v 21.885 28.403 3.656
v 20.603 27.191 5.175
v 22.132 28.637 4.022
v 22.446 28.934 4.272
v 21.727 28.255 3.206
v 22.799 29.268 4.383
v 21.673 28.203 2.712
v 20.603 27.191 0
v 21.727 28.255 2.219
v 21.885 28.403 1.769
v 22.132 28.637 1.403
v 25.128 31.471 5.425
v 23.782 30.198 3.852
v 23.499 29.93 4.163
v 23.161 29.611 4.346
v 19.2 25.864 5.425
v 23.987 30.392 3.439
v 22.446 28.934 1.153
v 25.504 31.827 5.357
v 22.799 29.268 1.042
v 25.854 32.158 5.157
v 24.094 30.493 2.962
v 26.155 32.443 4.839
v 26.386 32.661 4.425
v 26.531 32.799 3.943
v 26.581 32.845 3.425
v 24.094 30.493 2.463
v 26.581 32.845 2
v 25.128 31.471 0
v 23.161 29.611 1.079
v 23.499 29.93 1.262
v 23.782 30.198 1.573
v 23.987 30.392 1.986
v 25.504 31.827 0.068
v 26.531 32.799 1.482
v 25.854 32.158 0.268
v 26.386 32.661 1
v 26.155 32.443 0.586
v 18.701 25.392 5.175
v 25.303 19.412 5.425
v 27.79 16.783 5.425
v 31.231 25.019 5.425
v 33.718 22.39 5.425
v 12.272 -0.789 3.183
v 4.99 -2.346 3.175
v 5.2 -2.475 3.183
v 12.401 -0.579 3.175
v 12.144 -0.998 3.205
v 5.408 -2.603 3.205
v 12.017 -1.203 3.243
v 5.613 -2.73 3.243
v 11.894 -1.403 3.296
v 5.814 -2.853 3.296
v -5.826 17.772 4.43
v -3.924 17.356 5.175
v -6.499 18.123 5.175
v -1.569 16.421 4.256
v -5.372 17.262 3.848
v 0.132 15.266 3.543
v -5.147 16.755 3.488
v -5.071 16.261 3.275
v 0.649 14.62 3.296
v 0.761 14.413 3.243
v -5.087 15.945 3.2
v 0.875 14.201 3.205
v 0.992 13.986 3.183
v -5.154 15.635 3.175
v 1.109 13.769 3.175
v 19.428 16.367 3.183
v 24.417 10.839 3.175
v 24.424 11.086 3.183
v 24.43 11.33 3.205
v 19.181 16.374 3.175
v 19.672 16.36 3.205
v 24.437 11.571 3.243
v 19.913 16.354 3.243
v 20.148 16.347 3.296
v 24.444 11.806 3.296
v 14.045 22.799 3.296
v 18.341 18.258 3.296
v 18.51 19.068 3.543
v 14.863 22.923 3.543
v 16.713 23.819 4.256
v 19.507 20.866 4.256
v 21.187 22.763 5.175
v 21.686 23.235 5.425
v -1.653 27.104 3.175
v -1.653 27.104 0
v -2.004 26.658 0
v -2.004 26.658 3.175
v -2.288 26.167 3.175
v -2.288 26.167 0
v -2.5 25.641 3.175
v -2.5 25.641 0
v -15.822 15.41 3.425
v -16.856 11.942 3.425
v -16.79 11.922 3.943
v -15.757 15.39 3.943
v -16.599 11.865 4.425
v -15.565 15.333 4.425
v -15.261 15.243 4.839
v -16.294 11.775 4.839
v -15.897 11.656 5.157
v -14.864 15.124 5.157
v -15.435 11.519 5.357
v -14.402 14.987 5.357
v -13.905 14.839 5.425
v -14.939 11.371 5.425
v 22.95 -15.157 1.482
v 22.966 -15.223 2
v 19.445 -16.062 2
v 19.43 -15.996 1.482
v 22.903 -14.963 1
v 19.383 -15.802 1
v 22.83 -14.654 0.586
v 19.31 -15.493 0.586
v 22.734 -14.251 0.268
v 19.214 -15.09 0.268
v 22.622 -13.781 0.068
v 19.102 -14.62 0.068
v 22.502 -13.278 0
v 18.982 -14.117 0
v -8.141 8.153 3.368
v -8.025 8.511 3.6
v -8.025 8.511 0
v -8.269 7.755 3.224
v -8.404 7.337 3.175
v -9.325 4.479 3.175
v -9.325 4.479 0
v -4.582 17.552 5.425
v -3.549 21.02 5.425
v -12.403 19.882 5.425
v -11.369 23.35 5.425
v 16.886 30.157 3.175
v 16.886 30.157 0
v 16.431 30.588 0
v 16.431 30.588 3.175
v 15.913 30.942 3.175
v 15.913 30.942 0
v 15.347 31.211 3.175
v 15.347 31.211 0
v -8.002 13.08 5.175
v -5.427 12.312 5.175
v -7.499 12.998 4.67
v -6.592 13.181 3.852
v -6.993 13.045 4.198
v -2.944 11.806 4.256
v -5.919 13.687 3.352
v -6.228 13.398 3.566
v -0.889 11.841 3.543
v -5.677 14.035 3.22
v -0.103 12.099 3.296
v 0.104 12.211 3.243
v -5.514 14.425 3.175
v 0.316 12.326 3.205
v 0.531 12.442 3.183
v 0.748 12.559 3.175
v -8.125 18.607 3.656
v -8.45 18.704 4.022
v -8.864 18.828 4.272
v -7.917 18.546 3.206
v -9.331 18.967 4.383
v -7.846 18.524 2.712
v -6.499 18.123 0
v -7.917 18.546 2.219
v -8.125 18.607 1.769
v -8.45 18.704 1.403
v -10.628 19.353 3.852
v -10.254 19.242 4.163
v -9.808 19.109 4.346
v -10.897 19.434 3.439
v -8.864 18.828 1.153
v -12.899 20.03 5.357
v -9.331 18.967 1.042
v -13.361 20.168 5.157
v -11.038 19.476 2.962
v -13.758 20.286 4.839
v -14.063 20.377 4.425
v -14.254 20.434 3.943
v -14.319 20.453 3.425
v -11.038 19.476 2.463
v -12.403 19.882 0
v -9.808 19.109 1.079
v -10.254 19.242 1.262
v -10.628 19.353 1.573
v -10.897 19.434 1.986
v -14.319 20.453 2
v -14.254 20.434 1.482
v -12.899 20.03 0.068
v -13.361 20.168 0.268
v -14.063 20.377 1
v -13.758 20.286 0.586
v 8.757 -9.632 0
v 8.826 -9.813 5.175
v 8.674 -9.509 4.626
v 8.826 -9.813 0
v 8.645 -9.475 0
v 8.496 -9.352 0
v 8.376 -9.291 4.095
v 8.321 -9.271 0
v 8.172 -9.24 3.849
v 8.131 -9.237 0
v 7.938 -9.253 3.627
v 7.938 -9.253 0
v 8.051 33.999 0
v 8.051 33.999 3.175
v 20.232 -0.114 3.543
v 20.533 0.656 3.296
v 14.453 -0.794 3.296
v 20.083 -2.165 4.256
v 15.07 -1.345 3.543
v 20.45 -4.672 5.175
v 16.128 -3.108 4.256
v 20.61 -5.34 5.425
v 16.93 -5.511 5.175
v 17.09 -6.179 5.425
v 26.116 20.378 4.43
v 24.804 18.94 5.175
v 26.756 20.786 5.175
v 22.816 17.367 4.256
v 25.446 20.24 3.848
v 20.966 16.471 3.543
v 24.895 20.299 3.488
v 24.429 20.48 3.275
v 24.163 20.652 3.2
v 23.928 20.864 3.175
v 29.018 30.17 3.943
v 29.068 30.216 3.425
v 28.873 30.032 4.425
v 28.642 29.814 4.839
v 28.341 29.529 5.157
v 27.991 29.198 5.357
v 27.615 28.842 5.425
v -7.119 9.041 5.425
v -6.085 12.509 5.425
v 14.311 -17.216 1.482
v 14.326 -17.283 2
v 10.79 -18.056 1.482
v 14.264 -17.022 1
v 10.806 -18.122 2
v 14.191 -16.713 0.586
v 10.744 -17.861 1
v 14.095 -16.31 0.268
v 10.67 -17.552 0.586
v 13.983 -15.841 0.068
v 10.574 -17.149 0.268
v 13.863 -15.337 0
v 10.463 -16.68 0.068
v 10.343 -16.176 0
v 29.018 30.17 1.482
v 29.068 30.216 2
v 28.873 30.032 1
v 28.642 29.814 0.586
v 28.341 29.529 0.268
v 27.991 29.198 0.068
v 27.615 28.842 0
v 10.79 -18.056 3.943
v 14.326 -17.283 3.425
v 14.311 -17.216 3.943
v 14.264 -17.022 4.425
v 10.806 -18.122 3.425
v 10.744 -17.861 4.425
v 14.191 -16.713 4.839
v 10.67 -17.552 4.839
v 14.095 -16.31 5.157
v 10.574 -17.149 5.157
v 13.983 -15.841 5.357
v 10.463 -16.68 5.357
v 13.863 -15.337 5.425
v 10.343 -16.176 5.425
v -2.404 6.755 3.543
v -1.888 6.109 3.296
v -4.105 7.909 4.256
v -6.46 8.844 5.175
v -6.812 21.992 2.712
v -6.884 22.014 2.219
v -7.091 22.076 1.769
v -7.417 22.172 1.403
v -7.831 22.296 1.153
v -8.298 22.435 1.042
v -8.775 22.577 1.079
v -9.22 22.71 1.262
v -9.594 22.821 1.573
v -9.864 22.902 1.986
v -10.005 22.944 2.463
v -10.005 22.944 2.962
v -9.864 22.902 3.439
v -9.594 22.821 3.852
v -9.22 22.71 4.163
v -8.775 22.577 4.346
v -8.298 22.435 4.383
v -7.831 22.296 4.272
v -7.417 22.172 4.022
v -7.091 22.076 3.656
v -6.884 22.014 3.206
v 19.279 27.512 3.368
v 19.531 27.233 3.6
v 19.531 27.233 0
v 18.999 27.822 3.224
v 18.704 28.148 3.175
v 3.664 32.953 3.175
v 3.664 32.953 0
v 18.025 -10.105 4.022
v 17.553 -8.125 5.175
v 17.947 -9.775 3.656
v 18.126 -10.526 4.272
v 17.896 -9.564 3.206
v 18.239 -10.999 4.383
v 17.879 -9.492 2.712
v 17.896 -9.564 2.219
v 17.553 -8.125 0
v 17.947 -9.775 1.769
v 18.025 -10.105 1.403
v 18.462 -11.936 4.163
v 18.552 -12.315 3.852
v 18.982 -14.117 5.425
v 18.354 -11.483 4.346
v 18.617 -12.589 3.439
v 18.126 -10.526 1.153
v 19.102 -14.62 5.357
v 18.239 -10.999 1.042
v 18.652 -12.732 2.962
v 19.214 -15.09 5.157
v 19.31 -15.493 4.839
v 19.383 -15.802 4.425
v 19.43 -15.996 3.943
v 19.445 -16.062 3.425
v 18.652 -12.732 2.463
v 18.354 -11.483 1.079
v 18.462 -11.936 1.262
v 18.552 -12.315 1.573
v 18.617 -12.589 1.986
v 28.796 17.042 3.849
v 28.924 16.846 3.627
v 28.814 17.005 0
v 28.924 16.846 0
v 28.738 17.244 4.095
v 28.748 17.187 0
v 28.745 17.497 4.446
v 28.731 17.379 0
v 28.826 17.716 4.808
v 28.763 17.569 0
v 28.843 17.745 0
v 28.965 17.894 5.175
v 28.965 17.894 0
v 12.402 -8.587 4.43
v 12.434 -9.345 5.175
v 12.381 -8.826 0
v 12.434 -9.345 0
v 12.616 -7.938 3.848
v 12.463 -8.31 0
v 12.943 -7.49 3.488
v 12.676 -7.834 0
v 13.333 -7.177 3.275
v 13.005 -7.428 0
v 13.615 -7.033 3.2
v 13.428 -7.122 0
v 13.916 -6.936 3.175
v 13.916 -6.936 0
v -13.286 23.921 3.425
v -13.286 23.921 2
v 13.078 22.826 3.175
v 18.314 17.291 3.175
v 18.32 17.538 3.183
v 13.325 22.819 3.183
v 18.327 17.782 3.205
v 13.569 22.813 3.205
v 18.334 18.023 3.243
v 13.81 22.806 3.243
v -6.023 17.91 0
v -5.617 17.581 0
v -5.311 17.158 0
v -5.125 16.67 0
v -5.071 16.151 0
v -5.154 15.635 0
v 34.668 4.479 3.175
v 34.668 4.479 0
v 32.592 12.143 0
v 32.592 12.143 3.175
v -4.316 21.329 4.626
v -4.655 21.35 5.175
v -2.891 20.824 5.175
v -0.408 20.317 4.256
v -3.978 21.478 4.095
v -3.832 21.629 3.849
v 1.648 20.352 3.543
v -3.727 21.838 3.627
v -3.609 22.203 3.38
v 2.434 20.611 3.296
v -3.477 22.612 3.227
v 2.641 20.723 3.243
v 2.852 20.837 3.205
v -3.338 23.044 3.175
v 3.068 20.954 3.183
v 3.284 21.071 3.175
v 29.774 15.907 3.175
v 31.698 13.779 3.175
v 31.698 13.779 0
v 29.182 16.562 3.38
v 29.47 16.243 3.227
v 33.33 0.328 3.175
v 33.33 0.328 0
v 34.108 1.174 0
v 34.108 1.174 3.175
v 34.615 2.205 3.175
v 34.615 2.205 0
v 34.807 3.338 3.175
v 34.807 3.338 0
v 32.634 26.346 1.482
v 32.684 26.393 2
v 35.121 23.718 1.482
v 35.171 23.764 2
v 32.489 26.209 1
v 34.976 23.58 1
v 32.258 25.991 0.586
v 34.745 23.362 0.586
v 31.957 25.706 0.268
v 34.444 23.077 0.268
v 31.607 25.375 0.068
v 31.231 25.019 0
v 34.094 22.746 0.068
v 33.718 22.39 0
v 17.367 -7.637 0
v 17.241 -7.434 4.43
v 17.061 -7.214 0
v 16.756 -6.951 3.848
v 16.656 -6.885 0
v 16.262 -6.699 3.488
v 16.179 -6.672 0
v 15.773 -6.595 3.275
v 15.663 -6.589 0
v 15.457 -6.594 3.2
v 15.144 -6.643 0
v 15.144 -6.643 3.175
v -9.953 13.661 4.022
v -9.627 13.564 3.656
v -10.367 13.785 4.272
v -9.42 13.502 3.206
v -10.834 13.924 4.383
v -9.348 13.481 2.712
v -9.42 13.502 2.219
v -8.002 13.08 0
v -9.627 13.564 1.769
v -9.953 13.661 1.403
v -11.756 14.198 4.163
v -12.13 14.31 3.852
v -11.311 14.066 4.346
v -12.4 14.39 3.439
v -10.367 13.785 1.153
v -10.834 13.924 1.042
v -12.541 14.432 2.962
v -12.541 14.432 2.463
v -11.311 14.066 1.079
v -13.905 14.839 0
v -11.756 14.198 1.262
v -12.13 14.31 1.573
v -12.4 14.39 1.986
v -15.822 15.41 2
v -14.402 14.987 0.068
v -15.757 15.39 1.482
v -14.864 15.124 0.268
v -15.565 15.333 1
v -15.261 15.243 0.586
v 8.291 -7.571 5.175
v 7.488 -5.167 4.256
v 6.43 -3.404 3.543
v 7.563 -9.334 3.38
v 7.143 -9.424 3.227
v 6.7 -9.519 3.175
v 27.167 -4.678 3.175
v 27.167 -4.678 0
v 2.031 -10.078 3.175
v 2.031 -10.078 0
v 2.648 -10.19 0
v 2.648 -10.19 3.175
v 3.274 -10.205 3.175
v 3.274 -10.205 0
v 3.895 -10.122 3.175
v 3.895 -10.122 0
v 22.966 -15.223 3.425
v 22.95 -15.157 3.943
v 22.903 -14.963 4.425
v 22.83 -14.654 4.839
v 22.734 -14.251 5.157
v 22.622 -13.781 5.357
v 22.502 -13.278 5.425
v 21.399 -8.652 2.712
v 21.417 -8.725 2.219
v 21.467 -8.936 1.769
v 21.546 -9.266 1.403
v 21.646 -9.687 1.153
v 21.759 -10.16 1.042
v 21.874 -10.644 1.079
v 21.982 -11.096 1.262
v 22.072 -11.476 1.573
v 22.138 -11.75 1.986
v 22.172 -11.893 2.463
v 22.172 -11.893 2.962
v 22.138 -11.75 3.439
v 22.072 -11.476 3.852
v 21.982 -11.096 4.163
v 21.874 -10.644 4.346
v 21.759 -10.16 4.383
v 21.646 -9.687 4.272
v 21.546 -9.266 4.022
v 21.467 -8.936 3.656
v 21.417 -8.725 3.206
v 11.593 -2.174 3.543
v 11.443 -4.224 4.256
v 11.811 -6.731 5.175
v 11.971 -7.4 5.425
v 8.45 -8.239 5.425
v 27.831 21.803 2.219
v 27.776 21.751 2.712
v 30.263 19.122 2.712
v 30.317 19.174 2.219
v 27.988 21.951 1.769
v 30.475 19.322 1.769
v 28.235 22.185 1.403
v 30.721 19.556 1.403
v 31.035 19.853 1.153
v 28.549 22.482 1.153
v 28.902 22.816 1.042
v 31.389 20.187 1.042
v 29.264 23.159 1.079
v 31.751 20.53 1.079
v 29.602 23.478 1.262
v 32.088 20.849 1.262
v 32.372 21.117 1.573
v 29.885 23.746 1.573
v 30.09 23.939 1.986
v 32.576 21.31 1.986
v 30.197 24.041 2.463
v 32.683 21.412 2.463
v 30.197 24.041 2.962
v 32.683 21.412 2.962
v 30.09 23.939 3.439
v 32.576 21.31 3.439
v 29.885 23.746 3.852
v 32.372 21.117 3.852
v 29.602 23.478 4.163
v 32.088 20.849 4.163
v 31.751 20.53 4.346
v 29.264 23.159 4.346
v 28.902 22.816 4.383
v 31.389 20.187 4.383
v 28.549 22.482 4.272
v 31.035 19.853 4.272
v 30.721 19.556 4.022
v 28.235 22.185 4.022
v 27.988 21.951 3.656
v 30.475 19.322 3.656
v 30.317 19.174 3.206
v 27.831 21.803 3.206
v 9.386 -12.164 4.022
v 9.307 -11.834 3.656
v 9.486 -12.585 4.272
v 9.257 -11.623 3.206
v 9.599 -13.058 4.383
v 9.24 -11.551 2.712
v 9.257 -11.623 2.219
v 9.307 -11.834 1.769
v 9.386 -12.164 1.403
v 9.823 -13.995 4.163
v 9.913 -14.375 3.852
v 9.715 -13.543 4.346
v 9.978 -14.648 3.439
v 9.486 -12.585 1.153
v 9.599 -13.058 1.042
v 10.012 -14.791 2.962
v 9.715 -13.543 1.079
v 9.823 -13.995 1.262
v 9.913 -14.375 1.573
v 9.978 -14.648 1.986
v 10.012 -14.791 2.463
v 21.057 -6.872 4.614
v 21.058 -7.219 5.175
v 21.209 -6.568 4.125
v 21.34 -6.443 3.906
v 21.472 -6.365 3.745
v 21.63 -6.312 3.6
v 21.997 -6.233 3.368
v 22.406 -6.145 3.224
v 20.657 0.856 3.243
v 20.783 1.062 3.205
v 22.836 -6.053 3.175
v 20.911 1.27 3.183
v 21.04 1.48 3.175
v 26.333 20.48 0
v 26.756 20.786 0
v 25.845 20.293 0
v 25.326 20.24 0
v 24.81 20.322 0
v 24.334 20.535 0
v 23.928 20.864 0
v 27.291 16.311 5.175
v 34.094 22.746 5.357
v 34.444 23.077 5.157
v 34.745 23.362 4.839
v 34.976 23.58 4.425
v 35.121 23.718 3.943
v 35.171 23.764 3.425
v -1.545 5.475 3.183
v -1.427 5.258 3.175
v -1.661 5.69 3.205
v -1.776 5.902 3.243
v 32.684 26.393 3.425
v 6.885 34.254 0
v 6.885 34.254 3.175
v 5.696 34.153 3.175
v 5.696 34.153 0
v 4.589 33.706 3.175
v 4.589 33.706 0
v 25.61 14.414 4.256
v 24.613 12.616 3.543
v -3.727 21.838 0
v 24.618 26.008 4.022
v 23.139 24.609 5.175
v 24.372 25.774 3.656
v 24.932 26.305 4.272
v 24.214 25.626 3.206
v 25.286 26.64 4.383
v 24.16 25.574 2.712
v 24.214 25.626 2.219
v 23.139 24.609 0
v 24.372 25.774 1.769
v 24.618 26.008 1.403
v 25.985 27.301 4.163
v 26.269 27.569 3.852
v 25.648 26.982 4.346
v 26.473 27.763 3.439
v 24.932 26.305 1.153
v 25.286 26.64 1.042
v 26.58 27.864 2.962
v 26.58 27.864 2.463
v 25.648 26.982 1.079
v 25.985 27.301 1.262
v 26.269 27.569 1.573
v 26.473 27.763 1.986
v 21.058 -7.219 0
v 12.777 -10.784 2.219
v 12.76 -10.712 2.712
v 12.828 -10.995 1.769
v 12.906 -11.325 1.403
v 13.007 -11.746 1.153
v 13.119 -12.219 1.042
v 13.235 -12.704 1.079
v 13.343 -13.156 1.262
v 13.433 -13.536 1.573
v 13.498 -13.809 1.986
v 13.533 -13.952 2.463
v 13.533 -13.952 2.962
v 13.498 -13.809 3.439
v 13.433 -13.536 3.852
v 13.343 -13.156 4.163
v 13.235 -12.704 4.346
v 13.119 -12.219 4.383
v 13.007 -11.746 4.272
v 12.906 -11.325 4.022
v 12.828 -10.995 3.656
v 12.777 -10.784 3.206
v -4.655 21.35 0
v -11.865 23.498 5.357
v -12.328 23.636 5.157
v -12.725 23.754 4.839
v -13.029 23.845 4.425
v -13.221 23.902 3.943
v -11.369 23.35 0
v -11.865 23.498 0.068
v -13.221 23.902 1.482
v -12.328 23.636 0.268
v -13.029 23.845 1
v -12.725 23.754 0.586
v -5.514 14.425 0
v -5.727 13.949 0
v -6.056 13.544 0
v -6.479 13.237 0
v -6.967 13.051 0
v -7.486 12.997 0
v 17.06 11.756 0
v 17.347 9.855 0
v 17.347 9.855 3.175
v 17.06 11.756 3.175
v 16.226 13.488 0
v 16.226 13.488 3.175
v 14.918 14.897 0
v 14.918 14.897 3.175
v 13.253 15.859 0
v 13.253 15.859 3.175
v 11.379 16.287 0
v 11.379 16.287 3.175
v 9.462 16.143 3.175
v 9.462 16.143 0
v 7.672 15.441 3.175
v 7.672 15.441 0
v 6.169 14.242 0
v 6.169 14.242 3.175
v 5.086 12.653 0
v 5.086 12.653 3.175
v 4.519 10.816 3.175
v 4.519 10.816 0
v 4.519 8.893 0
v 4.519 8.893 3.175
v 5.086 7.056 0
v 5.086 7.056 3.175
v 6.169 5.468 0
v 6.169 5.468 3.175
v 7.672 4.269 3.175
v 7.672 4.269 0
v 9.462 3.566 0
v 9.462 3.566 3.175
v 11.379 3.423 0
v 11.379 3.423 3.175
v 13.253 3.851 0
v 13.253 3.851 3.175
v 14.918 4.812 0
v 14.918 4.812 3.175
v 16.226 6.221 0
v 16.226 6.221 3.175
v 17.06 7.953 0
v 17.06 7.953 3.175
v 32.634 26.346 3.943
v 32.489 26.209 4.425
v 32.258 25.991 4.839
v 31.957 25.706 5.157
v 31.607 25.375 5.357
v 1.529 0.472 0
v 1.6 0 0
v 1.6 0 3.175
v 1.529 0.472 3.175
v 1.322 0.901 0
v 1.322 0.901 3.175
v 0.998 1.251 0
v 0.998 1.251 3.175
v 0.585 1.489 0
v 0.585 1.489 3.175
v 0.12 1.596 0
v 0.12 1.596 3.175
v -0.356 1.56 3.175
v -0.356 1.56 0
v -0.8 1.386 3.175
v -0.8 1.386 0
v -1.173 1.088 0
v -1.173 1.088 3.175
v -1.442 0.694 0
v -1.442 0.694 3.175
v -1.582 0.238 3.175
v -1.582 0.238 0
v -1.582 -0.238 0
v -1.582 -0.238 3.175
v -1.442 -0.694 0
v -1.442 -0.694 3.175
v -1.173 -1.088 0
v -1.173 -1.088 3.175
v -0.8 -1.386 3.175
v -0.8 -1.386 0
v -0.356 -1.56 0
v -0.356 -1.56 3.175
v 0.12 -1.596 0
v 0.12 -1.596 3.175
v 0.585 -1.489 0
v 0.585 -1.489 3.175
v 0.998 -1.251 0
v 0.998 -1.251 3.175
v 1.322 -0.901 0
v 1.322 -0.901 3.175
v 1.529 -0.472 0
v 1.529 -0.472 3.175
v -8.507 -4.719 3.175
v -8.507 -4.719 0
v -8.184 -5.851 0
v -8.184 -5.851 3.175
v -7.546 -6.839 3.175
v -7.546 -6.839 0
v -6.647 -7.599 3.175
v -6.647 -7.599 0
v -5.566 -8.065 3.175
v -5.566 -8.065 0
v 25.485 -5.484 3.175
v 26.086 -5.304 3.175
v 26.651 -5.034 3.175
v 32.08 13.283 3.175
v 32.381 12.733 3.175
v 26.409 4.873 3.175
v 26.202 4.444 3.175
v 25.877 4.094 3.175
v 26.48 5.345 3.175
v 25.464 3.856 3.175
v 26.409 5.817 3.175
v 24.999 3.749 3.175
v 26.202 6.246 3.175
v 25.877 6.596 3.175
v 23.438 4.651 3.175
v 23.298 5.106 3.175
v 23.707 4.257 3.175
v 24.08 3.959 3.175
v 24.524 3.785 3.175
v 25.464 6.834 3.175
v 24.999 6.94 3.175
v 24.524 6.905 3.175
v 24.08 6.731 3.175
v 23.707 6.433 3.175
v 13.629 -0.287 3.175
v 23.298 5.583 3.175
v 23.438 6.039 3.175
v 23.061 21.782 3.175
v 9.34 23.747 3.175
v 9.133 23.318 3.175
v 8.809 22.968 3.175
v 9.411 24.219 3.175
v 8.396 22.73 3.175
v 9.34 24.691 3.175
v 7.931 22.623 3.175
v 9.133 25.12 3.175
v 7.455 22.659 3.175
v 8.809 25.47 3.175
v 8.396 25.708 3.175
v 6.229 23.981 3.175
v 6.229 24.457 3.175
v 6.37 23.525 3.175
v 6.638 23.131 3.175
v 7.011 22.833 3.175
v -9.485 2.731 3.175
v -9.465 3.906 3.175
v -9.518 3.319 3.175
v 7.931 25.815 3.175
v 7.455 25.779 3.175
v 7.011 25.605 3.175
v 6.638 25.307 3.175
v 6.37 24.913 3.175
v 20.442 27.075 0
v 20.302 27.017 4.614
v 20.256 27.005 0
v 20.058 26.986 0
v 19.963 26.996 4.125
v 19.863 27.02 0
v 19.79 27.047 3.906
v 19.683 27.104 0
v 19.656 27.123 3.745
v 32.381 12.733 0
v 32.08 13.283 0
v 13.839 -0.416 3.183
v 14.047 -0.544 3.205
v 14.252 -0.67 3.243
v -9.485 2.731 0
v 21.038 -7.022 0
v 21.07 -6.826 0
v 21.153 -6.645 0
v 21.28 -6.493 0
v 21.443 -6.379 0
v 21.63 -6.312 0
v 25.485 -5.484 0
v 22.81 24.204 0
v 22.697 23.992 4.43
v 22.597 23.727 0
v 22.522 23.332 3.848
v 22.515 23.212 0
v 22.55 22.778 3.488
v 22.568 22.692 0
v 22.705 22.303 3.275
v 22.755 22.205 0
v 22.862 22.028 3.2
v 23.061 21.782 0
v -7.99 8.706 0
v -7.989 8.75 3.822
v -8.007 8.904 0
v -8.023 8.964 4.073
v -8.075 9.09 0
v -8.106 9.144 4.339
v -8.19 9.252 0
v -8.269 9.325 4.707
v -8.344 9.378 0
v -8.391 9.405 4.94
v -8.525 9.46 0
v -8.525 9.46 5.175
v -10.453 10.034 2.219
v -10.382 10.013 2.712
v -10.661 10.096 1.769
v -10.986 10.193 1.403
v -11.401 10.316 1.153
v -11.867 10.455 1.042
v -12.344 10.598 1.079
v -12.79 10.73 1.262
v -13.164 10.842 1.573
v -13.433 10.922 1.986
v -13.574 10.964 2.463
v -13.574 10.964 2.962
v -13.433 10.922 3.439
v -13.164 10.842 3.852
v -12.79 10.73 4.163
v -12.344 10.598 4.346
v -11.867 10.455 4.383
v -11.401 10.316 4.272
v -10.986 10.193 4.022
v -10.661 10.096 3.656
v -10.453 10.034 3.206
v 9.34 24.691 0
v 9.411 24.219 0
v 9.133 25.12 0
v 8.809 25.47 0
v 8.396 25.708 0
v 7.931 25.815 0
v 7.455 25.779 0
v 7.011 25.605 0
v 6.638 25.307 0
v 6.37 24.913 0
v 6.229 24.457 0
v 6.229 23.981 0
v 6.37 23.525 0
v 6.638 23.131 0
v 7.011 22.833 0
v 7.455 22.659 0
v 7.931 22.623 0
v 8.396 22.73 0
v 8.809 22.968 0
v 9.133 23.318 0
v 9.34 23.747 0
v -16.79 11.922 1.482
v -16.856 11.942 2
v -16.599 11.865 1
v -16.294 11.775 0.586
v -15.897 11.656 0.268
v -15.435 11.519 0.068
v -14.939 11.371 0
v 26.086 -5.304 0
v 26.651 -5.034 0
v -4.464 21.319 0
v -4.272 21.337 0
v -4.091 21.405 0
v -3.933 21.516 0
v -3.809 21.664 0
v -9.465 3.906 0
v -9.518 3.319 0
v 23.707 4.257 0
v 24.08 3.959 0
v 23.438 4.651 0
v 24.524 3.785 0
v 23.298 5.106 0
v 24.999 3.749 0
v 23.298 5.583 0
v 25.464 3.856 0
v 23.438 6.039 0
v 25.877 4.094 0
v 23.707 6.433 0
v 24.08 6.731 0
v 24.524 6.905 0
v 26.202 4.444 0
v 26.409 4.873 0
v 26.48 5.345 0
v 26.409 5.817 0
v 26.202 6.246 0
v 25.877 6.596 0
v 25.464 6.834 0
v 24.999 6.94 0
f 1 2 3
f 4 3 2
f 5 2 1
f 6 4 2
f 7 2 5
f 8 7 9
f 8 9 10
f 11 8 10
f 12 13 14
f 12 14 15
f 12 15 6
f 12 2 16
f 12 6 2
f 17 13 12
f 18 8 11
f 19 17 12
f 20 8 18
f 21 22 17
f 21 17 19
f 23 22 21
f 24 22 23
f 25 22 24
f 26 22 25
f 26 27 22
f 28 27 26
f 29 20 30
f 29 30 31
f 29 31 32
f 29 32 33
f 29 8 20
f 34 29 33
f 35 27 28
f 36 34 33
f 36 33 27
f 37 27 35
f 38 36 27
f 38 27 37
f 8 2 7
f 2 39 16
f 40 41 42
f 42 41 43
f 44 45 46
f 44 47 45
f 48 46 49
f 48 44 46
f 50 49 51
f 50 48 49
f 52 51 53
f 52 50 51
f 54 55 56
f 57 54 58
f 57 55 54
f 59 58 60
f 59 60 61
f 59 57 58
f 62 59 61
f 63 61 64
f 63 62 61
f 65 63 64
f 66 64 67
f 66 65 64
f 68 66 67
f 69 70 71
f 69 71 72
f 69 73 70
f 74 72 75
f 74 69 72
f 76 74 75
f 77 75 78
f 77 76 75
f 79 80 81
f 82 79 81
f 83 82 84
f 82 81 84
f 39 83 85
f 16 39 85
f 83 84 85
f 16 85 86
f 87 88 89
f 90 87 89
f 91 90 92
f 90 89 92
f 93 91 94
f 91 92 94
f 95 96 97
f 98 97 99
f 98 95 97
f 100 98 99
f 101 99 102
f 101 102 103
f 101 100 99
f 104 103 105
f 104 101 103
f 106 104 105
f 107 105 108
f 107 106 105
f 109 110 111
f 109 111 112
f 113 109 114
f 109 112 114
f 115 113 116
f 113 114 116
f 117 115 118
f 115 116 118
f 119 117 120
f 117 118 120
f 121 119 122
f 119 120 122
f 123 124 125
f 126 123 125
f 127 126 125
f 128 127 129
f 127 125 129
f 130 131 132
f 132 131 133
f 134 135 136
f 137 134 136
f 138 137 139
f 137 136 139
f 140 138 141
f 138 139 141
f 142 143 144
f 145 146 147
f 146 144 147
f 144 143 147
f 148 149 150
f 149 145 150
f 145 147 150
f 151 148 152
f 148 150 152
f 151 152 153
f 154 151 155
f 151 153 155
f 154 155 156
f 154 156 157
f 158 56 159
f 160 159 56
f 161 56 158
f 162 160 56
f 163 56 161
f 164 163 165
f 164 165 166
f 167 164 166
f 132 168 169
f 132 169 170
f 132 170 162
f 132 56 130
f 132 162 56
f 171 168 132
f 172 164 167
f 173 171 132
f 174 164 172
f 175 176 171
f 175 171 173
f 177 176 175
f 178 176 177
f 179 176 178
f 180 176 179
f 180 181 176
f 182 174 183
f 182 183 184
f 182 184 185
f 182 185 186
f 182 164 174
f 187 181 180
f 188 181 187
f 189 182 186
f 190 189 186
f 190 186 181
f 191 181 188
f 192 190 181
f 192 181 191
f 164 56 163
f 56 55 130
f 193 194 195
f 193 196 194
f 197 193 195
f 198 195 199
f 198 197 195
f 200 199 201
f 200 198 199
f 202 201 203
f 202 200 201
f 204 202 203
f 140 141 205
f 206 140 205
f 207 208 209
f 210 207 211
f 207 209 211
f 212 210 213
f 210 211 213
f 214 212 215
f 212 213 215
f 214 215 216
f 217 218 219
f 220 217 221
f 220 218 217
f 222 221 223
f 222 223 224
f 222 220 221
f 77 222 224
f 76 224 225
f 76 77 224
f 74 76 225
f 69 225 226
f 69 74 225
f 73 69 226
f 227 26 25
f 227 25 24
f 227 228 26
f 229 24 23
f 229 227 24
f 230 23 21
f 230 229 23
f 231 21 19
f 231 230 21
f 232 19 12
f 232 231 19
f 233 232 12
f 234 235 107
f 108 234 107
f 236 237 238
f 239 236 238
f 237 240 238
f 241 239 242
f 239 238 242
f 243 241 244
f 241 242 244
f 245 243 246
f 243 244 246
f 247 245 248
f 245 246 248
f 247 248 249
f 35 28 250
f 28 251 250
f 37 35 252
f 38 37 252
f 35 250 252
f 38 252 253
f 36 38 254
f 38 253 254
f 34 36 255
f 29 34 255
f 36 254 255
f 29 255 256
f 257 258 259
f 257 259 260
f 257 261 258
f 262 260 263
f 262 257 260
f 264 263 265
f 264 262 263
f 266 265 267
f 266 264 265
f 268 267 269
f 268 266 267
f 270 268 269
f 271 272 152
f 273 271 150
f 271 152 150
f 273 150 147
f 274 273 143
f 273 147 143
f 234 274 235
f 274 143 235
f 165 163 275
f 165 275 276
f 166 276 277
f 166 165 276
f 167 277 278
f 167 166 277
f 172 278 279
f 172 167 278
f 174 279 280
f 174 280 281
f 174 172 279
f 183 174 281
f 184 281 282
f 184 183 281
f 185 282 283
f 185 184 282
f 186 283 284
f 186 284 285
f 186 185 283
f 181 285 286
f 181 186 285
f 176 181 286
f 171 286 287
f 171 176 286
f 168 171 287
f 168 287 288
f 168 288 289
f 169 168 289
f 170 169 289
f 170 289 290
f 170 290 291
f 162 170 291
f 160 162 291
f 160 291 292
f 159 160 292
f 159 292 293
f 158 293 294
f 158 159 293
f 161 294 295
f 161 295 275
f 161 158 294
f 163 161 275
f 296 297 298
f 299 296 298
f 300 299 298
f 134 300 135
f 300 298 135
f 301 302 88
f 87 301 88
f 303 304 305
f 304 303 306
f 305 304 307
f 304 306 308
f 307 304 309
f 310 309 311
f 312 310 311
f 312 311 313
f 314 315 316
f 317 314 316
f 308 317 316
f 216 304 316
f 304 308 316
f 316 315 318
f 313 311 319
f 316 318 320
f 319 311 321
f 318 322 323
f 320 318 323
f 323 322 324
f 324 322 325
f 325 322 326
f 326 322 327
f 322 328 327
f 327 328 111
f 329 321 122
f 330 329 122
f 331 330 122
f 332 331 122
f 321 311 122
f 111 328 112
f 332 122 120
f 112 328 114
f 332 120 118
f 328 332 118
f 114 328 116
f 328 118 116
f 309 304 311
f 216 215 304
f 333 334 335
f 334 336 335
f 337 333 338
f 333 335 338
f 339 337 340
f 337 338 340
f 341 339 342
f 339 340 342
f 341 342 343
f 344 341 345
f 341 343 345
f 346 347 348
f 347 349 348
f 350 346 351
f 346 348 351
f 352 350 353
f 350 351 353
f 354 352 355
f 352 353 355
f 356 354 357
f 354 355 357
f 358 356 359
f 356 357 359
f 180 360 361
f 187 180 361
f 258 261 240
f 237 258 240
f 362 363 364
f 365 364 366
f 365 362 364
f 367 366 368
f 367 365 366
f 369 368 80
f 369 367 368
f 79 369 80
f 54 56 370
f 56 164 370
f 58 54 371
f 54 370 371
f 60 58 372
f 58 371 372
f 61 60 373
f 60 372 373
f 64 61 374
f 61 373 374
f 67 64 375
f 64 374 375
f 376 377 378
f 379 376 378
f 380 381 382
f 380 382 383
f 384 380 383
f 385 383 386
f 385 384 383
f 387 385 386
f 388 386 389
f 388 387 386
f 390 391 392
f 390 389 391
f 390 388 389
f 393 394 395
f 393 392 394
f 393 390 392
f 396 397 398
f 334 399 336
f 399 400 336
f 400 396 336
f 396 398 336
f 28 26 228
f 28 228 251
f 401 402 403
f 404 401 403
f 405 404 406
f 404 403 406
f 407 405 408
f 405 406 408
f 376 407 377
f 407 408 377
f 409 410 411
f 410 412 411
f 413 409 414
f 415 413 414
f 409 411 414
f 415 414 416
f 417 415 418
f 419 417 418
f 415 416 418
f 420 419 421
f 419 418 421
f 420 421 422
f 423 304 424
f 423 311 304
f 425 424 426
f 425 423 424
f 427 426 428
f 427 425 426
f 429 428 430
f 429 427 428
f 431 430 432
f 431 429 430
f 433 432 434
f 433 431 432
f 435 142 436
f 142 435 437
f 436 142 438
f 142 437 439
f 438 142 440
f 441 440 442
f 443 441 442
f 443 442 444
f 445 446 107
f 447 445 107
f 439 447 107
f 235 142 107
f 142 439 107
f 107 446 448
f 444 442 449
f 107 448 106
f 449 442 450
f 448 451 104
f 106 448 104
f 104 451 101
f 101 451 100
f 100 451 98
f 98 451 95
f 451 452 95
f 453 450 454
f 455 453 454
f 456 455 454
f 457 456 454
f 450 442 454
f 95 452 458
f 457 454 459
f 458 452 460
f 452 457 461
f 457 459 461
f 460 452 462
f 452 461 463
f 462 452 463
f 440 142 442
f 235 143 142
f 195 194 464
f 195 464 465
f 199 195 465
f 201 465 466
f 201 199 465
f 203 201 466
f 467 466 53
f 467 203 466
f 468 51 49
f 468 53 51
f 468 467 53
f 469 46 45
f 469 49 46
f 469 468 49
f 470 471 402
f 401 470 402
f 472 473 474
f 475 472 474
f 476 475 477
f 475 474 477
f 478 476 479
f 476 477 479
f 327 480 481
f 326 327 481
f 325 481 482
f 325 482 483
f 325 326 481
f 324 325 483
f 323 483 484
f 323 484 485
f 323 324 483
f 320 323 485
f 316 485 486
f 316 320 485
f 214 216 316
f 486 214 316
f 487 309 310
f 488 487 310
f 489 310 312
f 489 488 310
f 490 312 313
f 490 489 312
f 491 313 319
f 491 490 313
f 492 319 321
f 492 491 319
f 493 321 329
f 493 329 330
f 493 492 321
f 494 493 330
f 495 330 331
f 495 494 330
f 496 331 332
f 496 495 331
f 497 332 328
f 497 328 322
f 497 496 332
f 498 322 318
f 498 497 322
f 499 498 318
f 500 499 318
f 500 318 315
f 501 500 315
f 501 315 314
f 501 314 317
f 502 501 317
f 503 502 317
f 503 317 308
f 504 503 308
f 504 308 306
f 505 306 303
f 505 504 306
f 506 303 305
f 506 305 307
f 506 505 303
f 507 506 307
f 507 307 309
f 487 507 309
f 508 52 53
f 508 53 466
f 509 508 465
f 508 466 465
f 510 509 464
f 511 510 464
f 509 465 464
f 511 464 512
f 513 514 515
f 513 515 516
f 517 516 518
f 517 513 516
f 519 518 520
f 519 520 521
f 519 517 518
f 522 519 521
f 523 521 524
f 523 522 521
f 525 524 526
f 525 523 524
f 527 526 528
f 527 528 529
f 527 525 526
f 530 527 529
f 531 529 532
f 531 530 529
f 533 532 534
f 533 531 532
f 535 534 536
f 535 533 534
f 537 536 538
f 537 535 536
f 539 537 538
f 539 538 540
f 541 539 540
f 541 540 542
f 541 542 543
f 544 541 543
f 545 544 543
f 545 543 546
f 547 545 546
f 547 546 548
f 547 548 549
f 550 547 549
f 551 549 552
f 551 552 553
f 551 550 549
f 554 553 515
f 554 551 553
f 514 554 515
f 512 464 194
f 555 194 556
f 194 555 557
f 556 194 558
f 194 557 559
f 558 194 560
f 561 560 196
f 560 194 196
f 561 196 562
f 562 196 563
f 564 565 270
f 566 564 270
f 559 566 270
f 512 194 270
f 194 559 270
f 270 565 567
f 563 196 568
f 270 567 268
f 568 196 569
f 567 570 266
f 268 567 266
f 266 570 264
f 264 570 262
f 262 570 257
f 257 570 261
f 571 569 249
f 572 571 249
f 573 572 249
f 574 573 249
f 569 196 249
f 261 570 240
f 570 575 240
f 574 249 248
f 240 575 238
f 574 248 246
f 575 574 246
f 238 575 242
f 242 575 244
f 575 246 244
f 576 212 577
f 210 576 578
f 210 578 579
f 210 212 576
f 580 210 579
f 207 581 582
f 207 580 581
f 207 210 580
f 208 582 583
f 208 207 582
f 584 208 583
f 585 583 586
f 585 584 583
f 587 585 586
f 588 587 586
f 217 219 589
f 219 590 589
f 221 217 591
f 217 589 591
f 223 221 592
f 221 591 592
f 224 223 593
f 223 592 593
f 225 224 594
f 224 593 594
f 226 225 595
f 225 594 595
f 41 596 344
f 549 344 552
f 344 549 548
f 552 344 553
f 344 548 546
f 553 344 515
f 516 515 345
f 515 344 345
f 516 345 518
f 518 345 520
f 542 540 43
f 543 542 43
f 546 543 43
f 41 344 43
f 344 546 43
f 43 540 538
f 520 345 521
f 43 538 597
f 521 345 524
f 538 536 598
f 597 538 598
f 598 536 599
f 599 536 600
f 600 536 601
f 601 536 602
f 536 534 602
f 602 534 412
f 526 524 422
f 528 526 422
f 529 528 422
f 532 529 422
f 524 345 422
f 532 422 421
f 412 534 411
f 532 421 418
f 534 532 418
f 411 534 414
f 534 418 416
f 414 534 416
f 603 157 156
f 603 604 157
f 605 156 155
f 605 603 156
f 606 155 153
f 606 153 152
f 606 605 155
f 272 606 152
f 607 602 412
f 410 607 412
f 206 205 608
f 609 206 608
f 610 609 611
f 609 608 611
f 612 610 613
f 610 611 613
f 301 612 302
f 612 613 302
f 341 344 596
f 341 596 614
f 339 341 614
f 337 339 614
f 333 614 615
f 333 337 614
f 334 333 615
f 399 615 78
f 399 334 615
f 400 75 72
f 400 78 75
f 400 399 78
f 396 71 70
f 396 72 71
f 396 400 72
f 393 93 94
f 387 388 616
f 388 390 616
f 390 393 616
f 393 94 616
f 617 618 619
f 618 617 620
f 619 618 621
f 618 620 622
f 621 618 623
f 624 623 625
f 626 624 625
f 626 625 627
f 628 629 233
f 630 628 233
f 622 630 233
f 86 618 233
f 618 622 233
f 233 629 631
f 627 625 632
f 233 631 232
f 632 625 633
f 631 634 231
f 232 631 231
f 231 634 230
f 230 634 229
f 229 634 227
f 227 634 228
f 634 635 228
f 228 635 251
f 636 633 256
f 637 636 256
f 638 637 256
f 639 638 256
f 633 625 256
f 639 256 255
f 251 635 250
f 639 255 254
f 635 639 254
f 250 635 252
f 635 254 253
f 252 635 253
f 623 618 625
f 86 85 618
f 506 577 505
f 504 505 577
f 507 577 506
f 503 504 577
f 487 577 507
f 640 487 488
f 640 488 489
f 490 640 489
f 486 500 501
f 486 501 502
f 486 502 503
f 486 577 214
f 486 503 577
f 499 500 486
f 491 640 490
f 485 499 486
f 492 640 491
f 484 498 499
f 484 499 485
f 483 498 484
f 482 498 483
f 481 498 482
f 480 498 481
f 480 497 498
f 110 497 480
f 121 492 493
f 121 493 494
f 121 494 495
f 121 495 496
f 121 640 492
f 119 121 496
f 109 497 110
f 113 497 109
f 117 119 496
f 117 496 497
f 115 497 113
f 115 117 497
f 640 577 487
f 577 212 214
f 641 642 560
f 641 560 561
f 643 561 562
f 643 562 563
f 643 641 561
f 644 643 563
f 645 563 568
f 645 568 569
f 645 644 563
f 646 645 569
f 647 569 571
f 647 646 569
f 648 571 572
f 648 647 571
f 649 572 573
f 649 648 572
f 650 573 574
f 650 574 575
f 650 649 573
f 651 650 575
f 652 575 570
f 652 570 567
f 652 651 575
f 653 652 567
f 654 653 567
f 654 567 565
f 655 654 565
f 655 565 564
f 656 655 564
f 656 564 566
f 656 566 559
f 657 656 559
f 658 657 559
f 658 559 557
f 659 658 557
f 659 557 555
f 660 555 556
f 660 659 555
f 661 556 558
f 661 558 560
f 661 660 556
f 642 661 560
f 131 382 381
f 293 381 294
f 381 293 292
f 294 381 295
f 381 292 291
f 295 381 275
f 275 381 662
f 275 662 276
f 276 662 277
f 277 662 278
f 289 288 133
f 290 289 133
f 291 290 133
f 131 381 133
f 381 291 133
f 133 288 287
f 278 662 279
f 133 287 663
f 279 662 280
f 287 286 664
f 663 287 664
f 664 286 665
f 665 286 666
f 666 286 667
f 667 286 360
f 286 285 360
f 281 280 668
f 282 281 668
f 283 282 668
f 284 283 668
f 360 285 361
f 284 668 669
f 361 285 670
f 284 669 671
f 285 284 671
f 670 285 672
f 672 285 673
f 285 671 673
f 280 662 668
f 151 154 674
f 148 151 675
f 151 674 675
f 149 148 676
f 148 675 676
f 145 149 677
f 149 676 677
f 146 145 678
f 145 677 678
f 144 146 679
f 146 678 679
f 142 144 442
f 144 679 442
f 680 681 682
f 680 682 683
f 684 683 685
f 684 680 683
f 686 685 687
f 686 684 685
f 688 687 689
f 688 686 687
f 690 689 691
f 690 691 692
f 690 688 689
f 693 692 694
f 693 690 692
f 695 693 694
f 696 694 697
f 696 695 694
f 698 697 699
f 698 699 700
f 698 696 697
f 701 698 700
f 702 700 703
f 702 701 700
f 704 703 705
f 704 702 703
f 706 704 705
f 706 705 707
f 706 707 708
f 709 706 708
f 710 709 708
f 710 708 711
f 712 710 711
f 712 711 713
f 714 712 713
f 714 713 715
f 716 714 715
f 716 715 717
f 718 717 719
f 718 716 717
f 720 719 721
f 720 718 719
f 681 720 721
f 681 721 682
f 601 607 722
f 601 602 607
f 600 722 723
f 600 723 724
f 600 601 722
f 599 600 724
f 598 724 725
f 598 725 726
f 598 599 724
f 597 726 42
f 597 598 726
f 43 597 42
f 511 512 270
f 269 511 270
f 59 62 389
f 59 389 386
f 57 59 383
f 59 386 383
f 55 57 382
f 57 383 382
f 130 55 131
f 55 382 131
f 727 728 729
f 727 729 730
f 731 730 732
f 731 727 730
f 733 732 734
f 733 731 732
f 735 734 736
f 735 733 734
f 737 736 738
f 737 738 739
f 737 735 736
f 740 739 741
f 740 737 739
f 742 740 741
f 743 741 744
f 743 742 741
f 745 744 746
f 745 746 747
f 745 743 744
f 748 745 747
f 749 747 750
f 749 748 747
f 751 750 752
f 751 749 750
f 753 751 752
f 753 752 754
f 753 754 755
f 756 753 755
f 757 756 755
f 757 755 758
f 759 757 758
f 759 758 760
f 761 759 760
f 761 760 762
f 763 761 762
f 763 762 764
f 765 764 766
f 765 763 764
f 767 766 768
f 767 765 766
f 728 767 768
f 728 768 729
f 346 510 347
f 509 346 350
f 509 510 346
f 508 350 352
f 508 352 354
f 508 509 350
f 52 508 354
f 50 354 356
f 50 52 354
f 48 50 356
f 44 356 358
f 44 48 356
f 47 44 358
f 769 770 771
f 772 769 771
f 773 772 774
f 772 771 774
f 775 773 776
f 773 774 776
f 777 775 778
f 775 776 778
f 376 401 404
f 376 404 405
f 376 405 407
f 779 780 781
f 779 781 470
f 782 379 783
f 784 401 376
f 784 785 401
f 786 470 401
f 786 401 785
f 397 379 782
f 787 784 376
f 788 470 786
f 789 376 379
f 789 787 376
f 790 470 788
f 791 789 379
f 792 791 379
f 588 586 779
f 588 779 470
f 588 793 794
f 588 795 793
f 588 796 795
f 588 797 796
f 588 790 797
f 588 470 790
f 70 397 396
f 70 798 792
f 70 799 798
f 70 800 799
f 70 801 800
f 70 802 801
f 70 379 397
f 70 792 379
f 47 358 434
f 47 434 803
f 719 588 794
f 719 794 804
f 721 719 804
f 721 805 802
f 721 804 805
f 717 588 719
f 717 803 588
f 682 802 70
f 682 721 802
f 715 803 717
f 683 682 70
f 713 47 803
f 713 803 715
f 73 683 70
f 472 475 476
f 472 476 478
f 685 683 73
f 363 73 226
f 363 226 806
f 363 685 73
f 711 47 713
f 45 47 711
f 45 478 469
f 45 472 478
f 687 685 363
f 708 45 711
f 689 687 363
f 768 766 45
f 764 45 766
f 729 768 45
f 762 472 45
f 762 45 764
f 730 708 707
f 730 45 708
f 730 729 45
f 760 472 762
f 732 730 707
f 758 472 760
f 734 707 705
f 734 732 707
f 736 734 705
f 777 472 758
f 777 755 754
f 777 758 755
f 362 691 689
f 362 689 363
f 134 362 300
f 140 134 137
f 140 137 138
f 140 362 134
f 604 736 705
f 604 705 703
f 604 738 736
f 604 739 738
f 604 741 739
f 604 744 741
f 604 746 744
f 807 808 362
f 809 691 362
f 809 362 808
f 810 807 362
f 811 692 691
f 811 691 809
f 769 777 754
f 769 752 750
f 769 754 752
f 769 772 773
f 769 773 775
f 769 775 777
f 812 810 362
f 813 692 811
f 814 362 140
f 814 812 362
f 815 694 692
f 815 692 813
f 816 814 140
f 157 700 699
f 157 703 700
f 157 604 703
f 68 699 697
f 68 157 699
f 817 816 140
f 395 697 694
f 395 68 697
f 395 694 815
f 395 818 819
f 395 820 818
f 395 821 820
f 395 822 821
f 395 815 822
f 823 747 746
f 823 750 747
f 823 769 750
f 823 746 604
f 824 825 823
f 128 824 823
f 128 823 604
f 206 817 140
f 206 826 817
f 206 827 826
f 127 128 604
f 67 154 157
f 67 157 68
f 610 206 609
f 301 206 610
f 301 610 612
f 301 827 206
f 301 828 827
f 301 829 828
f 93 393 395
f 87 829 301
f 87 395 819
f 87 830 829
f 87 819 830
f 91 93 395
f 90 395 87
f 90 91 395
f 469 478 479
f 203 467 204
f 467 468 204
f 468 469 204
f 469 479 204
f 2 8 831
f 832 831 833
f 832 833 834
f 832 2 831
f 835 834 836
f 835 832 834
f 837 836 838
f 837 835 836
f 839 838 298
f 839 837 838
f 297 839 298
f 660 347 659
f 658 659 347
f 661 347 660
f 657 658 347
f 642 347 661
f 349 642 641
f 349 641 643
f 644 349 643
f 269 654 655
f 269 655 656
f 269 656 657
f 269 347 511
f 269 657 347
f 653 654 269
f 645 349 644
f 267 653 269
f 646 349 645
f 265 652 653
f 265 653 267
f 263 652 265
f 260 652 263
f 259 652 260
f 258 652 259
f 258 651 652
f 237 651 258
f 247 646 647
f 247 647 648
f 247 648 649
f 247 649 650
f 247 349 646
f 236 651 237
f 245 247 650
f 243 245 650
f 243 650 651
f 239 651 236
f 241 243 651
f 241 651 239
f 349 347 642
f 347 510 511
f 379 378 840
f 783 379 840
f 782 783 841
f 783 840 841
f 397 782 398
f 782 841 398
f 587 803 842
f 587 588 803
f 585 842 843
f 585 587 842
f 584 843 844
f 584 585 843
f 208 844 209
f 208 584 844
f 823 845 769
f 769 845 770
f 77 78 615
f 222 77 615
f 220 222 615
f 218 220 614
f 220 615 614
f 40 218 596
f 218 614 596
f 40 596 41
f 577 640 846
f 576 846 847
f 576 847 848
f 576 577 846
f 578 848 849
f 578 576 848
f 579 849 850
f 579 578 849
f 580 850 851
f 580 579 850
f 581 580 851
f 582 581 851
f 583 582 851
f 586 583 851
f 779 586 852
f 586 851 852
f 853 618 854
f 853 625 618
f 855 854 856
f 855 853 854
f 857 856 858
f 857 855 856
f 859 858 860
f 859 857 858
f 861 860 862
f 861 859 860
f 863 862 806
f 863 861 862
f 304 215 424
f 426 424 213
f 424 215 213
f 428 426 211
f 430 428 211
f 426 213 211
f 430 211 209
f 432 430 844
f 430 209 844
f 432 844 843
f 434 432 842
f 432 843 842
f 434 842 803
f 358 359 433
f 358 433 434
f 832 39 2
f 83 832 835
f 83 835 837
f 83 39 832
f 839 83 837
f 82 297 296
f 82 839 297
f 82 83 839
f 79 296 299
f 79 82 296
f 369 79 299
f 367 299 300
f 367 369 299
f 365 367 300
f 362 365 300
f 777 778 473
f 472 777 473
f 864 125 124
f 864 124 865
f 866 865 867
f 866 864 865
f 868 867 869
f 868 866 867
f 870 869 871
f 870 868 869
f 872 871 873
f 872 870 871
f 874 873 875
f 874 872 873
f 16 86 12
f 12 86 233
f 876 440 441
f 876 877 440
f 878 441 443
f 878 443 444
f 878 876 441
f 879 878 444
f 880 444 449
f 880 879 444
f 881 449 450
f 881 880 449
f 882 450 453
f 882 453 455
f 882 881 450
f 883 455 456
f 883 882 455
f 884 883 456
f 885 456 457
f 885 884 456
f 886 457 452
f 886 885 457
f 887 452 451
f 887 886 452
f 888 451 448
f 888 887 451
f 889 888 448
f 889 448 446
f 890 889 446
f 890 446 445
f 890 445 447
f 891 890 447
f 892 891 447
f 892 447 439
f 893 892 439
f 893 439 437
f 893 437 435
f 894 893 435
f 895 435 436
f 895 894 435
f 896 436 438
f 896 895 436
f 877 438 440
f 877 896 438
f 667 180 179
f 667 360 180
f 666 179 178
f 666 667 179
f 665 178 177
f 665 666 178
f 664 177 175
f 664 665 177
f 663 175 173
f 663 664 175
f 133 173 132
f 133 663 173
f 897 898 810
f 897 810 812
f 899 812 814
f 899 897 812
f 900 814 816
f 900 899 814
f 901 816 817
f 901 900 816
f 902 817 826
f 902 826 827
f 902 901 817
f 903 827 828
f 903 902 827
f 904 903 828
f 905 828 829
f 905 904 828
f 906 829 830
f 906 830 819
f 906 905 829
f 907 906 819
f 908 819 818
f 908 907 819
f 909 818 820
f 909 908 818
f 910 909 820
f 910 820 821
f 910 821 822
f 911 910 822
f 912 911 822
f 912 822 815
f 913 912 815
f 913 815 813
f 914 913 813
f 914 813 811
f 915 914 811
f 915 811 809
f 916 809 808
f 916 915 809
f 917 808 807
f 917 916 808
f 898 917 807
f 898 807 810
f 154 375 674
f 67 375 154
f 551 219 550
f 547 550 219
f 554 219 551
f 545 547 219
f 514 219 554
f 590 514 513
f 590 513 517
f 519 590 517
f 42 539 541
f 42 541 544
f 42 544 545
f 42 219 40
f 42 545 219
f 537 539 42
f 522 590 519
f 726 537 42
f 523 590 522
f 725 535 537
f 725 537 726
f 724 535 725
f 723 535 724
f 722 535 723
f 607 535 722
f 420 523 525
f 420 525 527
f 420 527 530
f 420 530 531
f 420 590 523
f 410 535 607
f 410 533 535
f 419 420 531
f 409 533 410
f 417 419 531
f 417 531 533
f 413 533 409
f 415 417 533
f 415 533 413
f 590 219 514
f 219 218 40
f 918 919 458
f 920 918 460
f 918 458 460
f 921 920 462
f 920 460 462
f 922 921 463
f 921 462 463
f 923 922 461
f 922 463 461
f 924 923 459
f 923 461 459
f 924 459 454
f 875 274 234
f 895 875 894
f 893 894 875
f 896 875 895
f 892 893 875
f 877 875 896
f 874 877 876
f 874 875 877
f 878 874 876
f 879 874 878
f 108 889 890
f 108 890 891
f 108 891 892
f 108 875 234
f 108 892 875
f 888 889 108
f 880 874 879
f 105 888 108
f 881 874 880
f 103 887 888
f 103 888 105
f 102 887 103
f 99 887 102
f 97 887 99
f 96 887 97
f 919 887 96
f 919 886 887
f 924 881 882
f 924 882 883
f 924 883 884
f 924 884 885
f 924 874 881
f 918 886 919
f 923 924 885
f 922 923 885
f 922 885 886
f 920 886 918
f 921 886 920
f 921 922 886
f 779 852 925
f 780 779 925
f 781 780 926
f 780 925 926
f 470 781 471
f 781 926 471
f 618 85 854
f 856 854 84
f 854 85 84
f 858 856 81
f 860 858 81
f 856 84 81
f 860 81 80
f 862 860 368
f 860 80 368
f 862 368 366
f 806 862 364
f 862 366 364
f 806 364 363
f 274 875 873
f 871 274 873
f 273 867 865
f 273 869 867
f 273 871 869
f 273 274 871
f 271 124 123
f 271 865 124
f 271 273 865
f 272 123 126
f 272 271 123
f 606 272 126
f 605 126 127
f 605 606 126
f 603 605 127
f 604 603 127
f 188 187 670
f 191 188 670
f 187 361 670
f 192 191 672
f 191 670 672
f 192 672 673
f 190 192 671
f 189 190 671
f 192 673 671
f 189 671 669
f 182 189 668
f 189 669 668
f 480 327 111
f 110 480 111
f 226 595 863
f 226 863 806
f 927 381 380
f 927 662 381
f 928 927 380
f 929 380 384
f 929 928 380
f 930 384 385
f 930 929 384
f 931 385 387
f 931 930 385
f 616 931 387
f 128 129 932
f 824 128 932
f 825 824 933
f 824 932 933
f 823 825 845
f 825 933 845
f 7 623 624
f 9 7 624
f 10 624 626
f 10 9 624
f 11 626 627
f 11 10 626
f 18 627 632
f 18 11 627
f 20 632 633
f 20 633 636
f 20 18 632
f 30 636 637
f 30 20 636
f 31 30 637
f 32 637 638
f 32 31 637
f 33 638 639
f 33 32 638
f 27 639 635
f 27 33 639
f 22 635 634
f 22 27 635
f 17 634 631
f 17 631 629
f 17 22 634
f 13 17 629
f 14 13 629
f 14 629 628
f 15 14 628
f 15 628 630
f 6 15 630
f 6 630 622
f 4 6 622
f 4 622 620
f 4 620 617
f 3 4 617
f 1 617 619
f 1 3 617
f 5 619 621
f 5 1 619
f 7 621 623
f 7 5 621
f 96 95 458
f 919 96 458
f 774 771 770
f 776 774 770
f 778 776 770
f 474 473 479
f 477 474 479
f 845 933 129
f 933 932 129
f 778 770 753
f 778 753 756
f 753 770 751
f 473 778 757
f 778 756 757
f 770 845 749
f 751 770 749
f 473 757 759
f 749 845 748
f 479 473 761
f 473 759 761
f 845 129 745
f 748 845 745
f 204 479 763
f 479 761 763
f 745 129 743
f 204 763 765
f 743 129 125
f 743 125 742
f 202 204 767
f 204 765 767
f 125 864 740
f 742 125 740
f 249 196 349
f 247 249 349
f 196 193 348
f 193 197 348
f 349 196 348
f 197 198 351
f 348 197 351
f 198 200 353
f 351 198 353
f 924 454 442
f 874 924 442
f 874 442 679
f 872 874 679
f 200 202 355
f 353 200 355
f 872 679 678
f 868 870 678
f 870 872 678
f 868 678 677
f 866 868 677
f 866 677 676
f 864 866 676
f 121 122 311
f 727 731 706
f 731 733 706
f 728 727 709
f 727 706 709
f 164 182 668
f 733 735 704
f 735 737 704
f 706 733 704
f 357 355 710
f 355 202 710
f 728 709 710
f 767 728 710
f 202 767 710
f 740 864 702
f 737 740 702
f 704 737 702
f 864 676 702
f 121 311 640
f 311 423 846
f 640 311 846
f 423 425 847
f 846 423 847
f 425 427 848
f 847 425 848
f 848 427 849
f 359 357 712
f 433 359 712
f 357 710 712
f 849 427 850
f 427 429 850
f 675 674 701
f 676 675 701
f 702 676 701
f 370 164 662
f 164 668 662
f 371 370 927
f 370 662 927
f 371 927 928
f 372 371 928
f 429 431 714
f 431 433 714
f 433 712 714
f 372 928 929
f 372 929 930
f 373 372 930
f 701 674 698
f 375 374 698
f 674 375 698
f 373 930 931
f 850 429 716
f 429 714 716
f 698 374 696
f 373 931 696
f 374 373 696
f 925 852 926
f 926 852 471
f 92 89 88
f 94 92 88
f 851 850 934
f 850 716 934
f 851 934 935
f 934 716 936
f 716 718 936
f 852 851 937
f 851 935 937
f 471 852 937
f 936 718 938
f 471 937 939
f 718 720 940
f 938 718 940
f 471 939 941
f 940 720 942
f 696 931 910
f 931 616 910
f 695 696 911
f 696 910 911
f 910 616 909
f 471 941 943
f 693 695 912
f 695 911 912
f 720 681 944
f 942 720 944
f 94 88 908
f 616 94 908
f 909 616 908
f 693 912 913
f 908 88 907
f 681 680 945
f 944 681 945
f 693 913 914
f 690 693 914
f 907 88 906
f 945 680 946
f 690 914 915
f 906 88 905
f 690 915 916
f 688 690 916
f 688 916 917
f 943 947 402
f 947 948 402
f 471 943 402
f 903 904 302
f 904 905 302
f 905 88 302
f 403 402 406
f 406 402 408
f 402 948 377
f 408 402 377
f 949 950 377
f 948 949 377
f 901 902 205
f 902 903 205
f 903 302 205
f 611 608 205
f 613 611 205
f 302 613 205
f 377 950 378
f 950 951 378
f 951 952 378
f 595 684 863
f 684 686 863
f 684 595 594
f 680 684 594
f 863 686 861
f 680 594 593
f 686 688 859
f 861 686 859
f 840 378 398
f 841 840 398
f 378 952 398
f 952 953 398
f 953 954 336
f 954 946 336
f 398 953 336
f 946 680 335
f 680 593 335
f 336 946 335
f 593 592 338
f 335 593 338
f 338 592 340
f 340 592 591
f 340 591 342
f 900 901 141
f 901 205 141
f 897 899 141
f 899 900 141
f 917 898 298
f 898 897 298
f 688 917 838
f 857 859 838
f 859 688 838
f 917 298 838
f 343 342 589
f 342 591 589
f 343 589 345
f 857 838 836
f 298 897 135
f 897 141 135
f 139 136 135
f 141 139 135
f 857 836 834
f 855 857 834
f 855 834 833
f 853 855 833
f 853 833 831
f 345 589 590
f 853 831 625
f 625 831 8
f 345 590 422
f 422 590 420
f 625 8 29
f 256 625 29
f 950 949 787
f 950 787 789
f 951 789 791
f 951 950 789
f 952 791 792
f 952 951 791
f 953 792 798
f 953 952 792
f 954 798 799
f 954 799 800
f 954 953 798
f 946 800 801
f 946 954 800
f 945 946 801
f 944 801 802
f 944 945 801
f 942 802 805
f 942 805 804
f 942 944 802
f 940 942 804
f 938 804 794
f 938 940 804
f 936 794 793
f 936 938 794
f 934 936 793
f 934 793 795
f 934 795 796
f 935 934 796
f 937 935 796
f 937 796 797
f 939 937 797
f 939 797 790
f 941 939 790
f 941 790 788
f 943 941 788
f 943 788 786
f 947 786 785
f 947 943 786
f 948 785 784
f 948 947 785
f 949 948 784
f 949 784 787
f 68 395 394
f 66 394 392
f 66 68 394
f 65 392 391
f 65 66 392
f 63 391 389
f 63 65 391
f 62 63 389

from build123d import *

# Parameters (mm, degrees)
SKETCH1_R                = 1.6
SKETCH1_R_2              = 6.45
BOSS_EXTRUDE1_DEPTH      = 3.175
SKETCH4_R                = 1.675
BOSS_EXTRUDE3_DEPTH      = 6.25
SKETCH4_2_R              = 1.675
CUT_EXTRUDE2_DEPTH       = 2.63125
FILLET1_R                = 2
FILLET2_R                = 2
FILLET3_R                = 2
CIRPATTERN2_COUNT        = 3
FILLET1_OF_CIRPATTERN2_R = 2
FILLET2_OF_CIRPATTERN2_R = 2
FILLET3_OF_CIRPATTERN2_R = 2
FILLET5_R                = 0.75


with BuildPart() as part:
    # Sketch1 → Boss-Extrude1 (new body)
    with BuildSketch(Plane.XY):
        with BuildLine():
            Line((15.347308801, 31.210973101), (8.051491314, 33.998880179))
            ThreePointArc((8.051491314, 33.998880179), (5.696175566, 34.15336703), (3.663829908, 32.952971436))
            Line((3.663829908, 32.952971436), (-1.653149933, 27.103867562))
            ThreePointArc((-1.653149933, 27.103867562), (-2.154824203, 26.417727613), (-2.500196213, 25.641078866))
            Line((-2.500196213, 25.641078866), (-9.325438013, 4.478720632))
            ThreePointArc((-9.325438013, 4.478720632), (-9.502063256, 3.613546149), (-9.484560317, 2.730700176))
            Line((-9.484560317, 2.730700176), (-8.507421128, -4.718687488))
            ThreePointArc((-8.507421128, -4.718687488), (-7.54564448, -6.839386894), (-5.565731281, -8.065080174))
            Line((-5.565731281, -8.065080174), (2.031002829, -10.077591551))
            ThreePointArc((2.031002829, -10.077591551), (2.960636861, -10.209852347), (3.895489669, -10.121746843))
            Line((3.895489669, -10.121746843), (25.485057009, -5.483666514))
            ThreePointArc((25.485057009, -5.483666514), (26.373611638, -5.180049941), (27.166902489, -4.677653705))
            Line((27.166902489, -4.677653705), (33.329625608, 0.328323939))
            ThreePointArc((33.329625608, 0.328323939), (34.614533997, 2.205289229), (34.668387555, 4.479291881))
            Line((34.668387555, 4.479291881), (32.591741985, 12.142614371))
            ThreePointArc((32.591741985, 12.142614371), (32.241466178, 13.013831458), (31.697738169, 13.779384986))
            Line((31.697738169, 13.779384986), (16.88625911, 30.157458595))
            ThreePointArc((16.88625911, 30.157458595), (16.17904213, 30.77516119), (15.347308801, 31.210973101))
        make_face()
        with Locations((24.879793107, 5.344918551)):
            Circle(SKETCH1_R, mode=Mode.SUBTRACT)
        with Locations((7.811061307, 24.218992148)):
            Circle(SKETCH1_R, mode=Mode.SUBTRACT)
        Circle(SKETCH1_R, mode=Mode.SUBTRACT)
        with Locations((10.896951472, 9.8546369)):
            Circle(SKETCH1_R_2, mode=Mode.SUBTRACT)
    extrude(amount=BOSS_EXTRUDE1_DEPTH)

    # Sketch4 → Boss-Extrude3 (add, symmetric)
    with BuildSketch(Plane(origin=(0.449621982, -0.475334512, 0), x_dir=(-0.726482741, -0.687184711, 0), z_dir=(0.687184711, -0.726482741, 0))):
        Polygon((-31.72132028, 0), (-31.72132028, -3.175), (-25.539496086, -3.175), (-31.72132028, -5.425), (-41.88132028, -5.425), (-41.88132028, 0), align=None)
        with Locations((-36.80132028, -2.7125)):
            Circle(SKETCH4_R, mode=Mode.SUBTRACT)
    boss_extrude3 = extrude(amount=BOSS_EXTRUDE3_DEPTH, both=True)

    # Sketch4<2> → Cut-Extrude2 (cut, symmetric)
    with BuildSketch(Plane(origin=(0.449621982, -0.475334512, 0), x_dir=(-0.726482741, -0.687184711, 0), z_dir=(0.687184711, -0.726482741, 0))):
        Polygon((-31.72132028, 0), (-31.72132028, -3.175), (-25.539496086, -3.175), (-31.72132028, -5.425), (-41.88132028, -5.425), (-41.88132028, 0), align=None)
        with Locations((-36.80132028, -2.7125)):
            Circle(SKETCH4_2_R, mode=Mode.SUBTRACT)
    cut_extrude2 = extrude(amount=CUT_EXTRUDE2_DEPTH, both=True, mode=Mode.SUBTRACT)

    # Fillet1
    fillet1_edges = [part.edges().sort_by_distance(p)[0] for p in [
        (19.440964609, 21.110601986, 3.175),
        (23.057274153, 17.287486564, 3.175),
        (25.865326768, 14.96244967, 3.175),
        (17.377217607, 24.139682361, 3.175),
        (22.0551547, 13.848979318, 3.175),
        (15.952095481, 20.301054157, 3.175),
    ]]
    fillet(fillet1_edges, radius=FILLET1_R)

    # Fillet2
    fillet2_edges = [part.edges().sort_by_distance(p)[0] for p in [
        (25.302768444, 19.411514101, 1.5875),
        (21.6864589, 23.234629523, 1.5875),
    ]]
    fillet(fillet2_edges, radius=FILLET2_R)

    # Fillet3
    fillet3_edges = [part.edges().sort_by_distance(p)[0] for p in [
        (27.824148706, 31.530905901, 0),
        (33.927207925, 25.078831062, 0),
        (33.927207925, 25.078831062, 5.425),
        (27.824148706, 31.530905901, 5.425),
    ]]
    fillet(fillet3_edges, radius=FILLET3_R)

    # CirPattern2: Boss-Extrude3, Cut-Extrude2 ×3 about axis
    cirpattern2_axis = Axis((10.896951472, 9.8546369, 0), (0, 0, 1))
    for i in range(1, CIRPATTERN2_COUNT):
        add(boss_extrude3.rotate(cirpattern2_axis, i * 360 / CIRPATTERN2_COUNT))
        add(cut_extrude2.rotate(cirpattern2_axis, i * 360 / CIRPATTERN2_COUNT), mode=Mode.SUBTRACT)

    # Fillet1 of CirPattern2
    fillet1_of_cirpattern2_edges = [part.edges().sort_by_distance(p)[0] for p in [
        (-3.123006806, 11.625986784, 3.175),
        (-1.620246501, 16.669360428, 3.175),
        (-1.010731793, 20.263723774, 3.175),
        (-4.71439386, 8.324189266, 3.175),
        (1.858647852, 17.520753147, 3.175),
        (-0.677483256, 9.009311403, 3.175),
        (16.372896612, -3.172678071, 3.175),
        (11.253826762, -4.392936293, 3.175),
        (7.836259441, -5.662262745, 3.175),
        (20.028030667, -2.899960928, 3.175),
        (8.777051863, -1.805821766, 3.175),
        (17.41624219, 0.253545139, 3.175),
    ]]
    fillet(fillet1_of_cirpattern2_edges, radius=FILLET1_OF_CIRPATTERN2_R)

    # Fillet2 of CirPattern2
    fillet2_of_cirpattern2_edges = [part.edges().sort_by_distance(p)[0] for p in [
        (-4.582455452, 17.552001759, 1.5875),
        (-6.085215757, 12.508628115, 1.5875),
        (11.970541423, -7.399605162, 1.5875),
        (17.089611272, -6.17934694, 1.5875),
    ]]
    fillet(fillet2_of_cirpattern2_edges, radius=FILLET2_OF_CIRPATTERN2_R)

    # Fillet3 of CirPattern2
    fillet3_of_cirpattern2_edges = [part.edges().sort_by_distance(p)[0] for p in [
        (-16.33884676, 13.675885219, 0),
        (-13.802715652, 22.187326963, 0),
        (-13.802715652, 22.187326963, 5.425),
        (-16.33884676, 13.675885219, 5.425),
        (21.205552469, -15.642880421, 0),
        (12.566362141, -17.702247326, 0),
        (12.566362141, -17.702247326, 5.425),
        (21.205552469, -15.642880421, 5.425),
    ]]
    fillet(fillet3_of_cirpattern2_edges, radius=FILLET3_OF_CIRPATTERN2_R)

    # Fillet5
    fillet5_edges = [part.edges().sort_by_distance(p)[0] for p in [
        (-7.789671487, 9.240521362, 1.5875),
        (-3.951849266, 21.140080535, 1.5875),
        (20.879758905, -6.473021336, 1.5875),
        (8.655527257, -9.099149384, 1.5875),
        (20.045714571, 26.663830856, 2.5875),
        (28.432123998, 17.390399731, 2.5875),
    ]]
    fillet(fillet5_edges, radius=FILLET5_R)


solid = part.part
